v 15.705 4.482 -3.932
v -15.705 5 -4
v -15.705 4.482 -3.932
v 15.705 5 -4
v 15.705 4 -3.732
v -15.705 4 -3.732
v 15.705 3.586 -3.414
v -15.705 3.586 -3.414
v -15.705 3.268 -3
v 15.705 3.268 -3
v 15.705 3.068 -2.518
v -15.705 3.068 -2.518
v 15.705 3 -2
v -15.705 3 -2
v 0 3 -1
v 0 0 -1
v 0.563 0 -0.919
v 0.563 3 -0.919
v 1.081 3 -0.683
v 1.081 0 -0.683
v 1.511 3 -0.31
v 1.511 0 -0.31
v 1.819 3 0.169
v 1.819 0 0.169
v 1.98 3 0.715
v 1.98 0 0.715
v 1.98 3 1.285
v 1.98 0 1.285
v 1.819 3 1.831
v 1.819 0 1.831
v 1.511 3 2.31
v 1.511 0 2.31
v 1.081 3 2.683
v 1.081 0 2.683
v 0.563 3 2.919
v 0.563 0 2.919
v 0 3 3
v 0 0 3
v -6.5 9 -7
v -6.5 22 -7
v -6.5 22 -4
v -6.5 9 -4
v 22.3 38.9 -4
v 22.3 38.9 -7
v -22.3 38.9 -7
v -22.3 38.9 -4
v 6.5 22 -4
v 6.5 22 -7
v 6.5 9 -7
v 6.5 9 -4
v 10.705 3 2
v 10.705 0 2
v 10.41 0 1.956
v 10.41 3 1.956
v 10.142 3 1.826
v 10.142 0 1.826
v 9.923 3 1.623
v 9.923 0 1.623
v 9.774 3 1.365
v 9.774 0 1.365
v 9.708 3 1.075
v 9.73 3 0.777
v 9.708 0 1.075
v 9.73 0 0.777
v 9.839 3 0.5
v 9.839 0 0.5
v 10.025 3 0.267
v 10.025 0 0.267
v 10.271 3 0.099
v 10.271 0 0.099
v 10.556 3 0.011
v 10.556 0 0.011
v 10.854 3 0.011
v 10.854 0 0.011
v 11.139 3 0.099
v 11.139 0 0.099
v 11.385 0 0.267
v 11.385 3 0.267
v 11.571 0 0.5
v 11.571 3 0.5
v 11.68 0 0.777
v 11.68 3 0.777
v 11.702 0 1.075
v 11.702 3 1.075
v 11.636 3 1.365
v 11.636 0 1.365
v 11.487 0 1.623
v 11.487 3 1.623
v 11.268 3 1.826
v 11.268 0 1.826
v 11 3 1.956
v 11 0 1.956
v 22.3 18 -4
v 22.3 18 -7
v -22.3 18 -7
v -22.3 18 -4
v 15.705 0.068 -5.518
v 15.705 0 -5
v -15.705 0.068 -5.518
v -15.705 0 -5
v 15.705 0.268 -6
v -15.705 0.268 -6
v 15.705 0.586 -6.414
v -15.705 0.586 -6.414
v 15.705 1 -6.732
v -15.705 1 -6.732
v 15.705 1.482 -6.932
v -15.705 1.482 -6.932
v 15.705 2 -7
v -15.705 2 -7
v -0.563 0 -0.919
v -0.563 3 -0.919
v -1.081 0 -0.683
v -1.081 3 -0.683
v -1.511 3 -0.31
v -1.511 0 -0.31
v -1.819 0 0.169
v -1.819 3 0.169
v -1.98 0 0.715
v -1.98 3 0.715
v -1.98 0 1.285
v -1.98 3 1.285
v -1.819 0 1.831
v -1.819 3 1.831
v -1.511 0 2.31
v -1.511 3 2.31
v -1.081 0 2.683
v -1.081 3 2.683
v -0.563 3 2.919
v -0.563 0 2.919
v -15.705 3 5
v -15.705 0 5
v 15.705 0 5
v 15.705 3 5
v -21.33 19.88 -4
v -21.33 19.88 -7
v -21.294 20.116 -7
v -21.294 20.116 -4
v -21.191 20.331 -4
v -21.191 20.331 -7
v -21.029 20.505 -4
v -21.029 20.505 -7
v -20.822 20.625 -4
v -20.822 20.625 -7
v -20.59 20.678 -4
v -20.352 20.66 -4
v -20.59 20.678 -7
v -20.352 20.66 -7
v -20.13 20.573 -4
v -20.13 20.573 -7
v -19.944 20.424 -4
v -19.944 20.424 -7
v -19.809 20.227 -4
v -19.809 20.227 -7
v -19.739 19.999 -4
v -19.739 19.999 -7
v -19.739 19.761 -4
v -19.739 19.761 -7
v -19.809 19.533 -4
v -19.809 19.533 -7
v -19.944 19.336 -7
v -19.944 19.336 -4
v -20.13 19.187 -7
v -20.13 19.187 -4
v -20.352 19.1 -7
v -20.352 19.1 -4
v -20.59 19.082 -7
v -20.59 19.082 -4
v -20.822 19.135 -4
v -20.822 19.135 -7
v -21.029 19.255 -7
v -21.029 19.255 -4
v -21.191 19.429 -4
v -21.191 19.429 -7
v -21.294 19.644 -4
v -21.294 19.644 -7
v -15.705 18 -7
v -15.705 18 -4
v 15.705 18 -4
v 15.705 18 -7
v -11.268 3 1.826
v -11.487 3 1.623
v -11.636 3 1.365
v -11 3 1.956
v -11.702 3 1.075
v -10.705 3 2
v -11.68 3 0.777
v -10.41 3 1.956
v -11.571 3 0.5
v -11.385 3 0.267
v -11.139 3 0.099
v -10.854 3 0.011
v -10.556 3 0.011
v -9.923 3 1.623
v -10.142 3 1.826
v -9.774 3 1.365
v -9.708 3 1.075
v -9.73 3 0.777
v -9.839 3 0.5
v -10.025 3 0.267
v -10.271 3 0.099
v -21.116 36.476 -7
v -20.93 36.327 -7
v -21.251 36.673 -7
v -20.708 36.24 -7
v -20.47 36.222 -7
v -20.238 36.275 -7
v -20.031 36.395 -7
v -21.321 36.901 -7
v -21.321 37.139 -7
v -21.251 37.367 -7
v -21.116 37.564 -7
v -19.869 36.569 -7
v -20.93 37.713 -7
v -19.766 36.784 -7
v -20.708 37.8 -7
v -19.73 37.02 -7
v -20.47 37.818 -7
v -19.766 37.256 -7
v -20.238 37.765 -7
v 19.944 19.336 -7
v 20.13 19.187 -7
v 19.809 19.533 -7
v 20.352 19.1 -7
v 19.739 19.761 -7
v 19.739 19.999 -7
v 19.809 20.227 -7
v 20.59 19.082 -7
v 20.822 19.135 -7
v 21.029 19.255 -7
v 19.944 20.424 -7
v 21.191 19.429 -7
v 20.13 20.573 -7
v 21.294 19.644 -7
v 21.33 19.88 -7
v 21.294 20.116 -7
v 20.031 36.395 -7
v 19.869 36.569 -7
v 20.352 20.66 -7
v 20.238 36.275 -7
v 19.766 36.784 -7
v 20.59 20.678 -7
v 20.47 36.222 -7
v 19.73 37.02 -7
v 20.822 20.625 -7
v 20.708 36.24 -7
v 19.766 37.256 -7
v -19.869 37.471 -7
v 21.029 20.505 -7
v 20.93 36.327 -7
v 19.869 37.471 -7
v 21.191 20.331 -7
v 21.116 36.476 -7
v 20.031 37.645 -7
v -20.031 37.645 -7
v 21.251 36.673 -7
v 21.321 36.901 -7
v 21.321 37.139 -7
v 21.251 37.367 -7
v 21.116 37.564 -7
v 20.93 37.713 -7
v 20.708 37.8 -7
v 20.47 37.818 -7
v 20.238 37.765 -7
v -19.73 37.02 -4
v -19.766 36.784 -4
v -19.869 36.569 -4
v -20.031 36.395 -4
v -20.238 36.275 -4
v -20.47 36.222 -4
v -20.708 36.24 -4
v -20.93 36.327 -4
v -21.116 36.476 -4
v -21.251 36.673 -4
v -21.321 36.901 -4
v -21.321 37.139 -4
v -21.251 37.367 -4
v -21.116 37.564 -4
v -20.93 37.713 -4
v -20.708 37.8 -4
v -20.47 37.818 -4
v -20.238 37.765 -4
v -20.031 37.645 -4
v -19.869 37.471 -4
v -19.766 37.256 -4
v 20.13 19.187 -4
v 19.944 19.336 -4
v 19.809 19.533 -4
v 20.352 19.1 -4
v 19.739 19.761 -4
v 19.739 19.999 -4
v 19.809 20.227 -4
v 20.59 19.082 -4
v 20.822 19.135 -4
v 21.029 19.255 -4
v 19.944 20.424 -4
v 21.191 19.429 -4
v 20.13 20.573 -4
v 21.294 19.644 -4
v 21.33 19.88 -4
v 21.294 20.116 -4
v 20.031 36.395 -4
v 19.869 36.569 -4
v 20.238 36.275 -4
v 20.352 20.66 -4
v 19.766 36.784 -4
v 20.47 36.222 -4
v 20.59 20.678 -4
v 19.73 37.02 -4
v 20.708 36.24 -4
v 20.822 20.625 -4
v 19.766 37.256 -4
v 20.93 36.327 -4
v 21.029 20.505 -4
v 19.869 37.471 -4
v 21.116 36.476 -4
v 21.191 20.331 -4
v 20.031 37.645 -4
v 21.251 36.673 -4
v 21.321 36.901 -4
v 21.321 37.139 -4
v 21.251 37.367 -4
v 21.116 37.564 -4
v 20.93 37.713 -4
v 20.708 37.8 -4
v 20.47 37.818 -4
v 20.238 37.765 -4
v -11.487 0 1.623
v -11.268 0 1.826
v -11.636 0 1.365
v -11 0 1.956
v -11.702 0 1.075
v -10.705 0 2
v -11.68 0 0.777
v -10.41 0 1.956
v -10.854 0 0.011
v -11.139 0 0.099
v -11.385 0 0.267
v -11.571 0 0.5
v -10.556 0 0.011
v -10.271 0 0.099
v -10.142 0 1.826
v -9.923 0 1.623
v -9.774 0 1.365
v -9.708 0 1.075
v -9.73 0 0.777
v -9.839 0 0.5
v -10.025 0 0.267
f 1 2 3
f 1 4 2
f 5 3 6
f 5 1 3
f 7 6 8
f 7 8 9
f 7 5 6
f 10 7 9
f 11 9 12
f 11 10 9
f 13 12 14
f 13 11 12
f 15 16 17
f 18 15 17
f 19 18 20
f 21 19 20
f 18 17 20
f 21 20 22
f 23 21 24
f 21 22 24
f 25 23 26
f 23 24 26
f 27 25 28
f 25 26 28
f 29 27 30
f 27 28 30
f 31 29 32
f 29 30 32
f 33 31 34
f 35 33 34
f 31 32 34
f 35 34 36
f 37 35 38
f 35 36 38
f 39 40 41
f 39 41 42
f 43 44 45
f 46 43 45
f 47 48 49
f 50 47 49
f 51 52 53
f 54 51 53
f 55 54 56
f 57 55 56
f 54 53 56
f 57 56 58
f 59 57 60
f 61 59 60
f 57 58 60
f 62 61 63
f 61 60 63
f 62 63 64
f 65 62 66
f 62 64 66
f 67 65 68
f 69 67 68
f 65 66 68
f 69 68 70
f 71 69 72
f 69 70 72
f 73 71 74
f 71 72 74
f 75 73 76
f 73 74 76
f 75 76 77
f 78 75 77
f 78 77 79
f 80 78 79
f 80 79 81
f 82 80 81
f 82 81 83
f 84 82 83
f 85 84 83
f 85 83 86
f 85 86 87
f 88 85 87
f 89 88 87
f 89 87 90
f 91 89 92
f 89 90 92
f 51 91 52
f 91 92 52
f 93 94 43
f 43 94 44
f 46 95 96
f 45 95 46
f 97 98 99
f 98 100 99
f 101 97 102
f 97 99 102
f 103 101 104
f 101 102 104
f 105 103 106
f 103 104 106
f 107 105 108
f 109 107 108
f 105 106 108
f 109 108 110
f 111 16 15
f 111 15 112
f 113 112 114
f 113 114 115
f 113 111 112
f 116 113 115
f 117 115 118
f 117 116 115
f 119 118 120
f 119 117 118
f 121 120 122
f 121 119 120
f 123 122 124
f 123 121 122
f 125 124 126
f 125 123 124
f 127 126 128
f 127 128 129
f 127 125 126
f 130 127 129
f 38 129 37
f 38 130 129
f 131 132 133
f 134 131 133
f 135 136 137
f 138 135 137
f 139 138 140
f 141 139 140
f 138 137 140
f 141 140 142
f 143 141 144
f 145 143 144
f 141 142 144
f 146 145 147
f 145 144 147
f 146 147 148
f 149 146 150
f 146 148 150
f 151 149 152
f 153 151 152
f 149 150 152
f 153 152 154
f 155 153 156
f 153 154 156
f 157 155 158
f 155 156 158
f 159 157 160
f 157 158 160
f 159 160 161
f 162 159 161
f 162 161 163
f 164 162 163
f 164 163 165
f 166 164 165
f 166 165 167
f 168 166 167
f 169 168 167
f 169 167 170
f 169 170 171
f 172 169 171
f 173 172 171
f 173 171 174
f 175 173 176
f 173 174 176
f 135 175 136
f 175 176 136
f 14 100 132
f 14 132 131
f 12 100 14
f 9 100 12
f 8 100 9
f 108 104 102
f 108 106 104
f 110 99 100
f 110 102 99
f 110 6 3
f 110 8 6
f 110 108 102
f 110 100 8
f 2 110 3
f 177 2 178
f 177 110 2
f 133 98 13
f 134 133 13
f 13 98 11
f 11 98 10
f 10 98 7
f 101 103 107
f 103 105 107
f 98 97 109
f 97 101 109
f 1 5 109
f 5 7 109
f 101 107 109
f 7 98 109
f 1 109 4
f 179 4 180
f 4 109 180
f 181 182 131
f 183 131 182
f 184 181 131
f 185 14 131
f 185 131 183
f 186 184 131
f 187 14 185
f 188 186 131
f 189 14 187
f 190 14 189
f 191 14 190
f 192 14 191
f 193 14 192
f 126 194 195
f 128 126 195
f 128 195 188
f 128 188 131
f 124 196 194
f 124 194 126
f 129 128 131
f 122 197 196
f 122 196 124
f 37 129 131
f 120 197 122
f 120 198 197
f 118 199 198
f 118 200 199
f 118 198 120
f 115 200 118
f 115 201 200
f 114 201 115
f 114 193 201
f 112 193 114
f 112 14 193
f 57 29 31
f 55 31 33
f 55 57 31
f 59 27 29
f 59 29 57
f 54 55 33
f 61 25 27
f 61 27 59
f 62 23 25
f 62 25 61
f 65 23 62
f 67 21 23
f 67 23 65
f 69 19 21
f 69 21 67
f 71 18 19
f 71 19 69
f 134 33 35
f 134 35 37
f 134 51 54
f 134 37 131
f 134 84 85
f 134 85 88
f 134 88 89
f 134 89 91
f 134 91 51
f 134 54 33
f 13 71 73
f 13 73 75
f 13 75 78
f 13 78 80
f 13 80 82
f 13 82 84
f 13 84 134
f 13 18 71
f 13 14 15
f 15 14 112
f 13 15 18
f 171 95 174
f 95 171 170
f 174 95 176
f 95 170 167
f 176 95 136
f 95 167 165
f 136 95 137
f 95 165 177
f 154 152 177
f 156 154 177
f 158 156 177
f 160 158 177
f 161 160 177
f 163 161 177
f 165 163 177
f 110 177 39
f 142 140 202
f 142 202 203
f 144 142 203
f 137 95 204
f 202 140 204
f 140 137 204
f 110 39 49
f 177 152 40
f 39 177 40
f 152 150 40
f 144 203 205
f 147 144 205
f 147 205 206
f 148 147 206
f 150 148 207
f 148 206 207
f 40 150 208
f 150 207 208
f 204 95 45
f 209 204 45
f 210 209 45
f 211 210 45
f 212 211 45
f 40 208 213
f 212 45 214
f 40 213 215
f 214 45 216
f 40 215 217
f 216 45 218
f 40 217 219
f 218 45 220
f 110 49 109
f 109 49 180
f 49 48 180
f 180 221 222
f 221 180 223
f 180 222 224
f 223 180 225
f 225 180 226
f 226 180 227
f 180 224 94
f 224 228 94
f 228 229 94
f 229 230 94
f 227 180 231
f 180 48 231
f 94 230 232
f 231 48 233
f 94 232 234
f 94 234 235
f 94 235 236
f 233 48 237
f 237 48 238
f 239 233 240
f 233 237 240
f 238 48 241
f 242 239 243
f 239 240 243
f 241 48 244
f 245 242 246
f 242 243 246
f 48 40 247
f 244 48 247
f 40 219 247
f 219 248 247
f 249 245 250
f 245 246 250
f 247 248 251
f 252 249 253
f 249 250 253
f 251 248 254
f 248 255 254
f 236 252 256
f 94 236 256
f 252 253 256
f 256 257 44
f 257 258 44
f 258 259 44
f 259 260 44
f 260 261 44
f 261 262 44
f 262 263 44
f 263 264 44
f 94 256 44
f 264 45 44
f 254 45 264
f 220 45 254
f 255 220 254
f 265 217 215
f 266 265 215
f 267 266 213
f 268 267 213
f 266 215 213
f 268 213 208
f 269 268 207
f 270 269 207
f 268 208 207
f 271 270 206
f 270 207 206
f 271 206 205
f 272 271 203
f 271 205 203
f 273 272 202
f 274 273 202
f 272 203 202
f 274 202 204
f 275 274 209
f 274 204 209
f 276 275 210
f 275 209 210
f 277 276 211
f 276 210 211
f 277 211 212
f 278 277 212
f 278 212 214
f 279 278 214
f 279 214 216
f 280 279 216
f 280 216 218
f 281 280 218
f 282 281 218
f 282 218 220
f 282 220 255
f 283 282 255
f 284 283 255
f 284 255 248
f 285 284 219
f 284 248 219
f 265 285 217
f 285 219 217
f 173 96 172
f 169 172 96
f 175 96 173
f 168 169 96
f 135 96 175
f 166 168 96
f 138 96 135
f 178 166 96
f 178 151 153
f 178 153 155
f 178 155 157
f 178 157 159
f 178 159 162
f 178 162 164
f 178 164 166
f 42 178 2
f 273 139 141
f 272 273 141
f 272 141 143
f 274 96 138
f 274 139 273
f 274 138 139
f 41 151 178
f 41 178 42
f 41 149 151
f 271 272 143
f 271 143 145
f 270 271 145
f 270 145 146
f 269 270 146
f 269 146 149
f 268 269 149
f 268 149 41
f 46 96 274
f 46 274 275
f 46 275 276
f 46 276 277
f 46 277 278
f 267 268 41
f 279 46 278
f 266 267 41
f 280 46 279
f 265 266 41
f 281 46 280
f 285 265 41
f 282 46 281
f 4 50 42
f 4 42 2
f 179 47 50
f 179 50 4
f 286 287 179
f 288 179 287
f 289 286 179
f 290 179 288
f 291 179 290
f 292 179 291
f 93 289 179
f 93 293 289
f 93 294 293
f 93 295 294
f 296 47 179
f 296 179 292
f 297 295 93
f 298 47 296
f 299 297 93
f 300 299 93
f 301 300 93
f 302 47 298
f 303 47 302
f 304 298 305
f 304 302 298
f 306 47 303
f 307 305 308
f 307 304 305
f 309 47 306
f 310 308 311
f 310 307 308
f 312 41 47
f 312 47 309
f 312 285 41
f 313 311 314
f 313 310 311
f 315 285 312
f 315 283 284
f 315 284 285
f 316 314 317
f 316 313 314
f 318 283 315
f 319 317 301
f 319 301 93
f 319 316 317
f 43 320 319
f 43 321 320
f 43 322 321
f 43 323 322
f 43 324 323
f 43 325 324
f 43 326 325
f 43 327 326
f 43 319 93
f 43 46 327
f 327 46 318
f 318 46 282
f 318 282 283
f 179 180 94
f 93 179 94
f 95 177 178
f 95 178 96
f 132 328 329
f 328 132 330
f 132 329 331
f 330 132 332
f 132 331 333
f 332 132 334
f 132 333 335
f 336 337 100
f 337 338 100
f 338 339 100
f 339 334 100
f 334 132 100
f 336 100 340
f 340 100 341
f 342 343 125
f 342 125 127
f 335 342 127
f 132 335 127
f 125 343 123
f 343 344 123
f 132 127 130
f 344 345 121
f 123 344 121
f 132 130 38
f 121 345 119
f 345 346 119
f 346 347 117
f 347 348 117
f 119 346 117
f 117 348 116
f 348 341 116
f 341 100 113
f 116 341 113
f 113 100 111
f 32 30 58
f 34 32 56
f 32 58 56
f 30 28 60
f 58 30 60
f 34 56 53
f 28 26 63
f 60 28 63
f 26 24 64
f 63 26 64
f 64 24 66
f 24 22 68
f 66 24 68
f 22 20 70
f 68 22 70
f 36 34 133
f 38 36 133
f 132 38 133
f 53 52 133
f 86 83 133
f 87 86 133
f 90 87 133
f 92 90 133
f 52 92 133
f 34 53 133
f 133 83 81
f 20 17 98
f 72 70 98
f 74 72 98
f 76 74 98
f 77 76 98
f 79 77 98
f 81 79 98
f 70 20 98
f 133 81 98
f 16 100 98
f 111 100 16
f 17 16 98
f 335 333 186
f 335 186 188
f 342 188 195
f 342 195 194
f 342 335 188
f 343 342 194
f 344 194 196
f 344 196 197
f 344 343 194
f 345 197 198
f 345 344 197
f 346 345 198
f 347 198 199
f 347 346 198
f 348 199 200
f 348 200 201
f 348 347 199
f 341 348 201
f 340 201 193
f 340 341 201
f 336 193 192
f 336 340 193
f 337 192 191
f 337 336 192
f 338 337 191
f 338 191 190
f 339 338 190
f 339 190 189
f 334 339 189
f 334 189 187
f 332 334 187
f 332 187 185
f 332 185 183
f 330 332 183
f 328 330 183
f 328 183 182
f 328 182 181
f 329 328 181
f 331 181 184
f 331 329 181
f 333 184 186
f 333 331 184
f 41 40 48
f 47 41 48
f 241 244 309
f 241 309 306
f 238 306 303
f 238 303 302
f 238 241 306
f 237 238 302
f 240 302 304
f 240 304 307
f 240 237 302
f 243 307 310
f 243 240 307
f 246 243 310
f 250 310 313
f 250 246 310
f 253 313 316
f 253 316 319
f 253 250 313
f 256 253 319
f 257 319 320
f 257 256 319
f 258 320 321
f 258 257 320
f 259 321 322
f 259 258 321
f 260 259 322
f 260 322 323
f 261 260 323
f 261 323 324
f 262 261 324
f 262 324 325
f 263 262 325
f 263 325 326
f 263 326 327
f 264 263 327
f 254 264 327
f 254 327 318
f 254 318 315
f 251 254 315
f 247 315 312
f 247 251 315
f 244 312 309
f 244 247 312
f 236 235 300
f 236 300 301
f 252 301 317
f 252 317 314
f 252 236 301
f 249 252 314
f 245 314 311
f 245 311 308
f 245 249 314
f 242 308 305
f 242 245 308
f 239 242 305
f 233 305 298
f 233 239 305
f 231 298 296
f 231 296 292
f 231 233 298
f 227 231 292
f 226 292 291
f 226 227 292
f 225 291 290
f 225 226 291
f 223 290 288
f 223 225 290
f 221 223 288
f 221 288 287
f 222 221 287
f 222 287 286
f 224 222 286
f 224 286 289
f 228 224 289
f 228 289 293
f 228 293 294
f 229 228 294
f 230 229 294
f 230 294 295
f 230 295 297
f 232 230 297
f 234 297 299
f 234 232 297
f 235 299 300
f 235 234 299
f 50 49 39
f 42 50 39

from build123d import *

# Parameters (mm, degrees)
SKETCH1_R           = 1
BOSS_EXTRUDE1_DEPTH = 3
SKETCH2_R           = 0.8
BOSS_EXTRUDE2_DEPTH = 3
FILLET1_R           = 2


with BuildPart() as part:
    # Sketch1 → Boss-Extrude1 (new body)
    with BuildSketch(Plane(origin=(0, 0, 0), x_dir=(1, 0, 0), z_dir=(0, 1, 0))):
        with BuildLine():
            Line((0, -3), (0, -5))
            Line((0, -5), (-15.705, -5))
            Line((-15.705, -5), (-15.705, 7))
            Line((-15.705, 7), (0, 7))
            Line((0, 7), (0, 1))
            ThreePointArc((0, 1), (-2, -1), (0, -3))
        make_face()
        with Locations(Location((-10.705, -1, 0), (0, 0, 270))):
            Circle(SKETCH1_R, mode=Mode.SUBTRACT)
    boss_extrude1 = extrude(amount=BOSS_EXTRUDE1_DEPTH)

    # Sketch2 → Boss-Extrude2 (add)
    with BuildSketch(Plane(origin=(0, 0, -7), x_dir=(-1, 0, 0), z_dir=(0, 0, -1))):
        Polygon((15.705, 3), (15.705, 18), (22.3, 18), (22.3, 38.9), (0, 38.9), (0, 22), (6.5, 22), (6.5, 9), (0, 9), (0, 3), align=None)
        with Locations((20.53, 19.88)):
            Circle(SKETCH2_R, mode=Mode.SUBTRACT)
        with Locations(Location((20.53, 37.02, 0), (0, 0, 180))):
            Circle(SKETCH2_R, mode=Mode.SUBTRACT)
    boss_extrude2 = extrude(amount=-BOSS_EXTRUDE2_DEPTH)

    # Mirror1: Boss-Extrude1, Boss-Extrude2 across plane
    add(boss_extrude1.mirror(Plane(origin=(0, 0, 0), x_dir=(0, 0, 1), z_dir=(1, 0, 0))))
    add(boss_extrude2.mirror(Plane(origin=(0, 0, 0), x_dir=(0, 0, 1), z_dir=(1, 0, 0))))

    # Fillet1
    fillet1_edges = [part.edges().sort_by_distance(p)[0] for p in [
        (0, 3, -4),
        (0, 0, -7),
    ]]
    fillet(fillet1_edges, radius=FILLET1_R)


solid = part.part
